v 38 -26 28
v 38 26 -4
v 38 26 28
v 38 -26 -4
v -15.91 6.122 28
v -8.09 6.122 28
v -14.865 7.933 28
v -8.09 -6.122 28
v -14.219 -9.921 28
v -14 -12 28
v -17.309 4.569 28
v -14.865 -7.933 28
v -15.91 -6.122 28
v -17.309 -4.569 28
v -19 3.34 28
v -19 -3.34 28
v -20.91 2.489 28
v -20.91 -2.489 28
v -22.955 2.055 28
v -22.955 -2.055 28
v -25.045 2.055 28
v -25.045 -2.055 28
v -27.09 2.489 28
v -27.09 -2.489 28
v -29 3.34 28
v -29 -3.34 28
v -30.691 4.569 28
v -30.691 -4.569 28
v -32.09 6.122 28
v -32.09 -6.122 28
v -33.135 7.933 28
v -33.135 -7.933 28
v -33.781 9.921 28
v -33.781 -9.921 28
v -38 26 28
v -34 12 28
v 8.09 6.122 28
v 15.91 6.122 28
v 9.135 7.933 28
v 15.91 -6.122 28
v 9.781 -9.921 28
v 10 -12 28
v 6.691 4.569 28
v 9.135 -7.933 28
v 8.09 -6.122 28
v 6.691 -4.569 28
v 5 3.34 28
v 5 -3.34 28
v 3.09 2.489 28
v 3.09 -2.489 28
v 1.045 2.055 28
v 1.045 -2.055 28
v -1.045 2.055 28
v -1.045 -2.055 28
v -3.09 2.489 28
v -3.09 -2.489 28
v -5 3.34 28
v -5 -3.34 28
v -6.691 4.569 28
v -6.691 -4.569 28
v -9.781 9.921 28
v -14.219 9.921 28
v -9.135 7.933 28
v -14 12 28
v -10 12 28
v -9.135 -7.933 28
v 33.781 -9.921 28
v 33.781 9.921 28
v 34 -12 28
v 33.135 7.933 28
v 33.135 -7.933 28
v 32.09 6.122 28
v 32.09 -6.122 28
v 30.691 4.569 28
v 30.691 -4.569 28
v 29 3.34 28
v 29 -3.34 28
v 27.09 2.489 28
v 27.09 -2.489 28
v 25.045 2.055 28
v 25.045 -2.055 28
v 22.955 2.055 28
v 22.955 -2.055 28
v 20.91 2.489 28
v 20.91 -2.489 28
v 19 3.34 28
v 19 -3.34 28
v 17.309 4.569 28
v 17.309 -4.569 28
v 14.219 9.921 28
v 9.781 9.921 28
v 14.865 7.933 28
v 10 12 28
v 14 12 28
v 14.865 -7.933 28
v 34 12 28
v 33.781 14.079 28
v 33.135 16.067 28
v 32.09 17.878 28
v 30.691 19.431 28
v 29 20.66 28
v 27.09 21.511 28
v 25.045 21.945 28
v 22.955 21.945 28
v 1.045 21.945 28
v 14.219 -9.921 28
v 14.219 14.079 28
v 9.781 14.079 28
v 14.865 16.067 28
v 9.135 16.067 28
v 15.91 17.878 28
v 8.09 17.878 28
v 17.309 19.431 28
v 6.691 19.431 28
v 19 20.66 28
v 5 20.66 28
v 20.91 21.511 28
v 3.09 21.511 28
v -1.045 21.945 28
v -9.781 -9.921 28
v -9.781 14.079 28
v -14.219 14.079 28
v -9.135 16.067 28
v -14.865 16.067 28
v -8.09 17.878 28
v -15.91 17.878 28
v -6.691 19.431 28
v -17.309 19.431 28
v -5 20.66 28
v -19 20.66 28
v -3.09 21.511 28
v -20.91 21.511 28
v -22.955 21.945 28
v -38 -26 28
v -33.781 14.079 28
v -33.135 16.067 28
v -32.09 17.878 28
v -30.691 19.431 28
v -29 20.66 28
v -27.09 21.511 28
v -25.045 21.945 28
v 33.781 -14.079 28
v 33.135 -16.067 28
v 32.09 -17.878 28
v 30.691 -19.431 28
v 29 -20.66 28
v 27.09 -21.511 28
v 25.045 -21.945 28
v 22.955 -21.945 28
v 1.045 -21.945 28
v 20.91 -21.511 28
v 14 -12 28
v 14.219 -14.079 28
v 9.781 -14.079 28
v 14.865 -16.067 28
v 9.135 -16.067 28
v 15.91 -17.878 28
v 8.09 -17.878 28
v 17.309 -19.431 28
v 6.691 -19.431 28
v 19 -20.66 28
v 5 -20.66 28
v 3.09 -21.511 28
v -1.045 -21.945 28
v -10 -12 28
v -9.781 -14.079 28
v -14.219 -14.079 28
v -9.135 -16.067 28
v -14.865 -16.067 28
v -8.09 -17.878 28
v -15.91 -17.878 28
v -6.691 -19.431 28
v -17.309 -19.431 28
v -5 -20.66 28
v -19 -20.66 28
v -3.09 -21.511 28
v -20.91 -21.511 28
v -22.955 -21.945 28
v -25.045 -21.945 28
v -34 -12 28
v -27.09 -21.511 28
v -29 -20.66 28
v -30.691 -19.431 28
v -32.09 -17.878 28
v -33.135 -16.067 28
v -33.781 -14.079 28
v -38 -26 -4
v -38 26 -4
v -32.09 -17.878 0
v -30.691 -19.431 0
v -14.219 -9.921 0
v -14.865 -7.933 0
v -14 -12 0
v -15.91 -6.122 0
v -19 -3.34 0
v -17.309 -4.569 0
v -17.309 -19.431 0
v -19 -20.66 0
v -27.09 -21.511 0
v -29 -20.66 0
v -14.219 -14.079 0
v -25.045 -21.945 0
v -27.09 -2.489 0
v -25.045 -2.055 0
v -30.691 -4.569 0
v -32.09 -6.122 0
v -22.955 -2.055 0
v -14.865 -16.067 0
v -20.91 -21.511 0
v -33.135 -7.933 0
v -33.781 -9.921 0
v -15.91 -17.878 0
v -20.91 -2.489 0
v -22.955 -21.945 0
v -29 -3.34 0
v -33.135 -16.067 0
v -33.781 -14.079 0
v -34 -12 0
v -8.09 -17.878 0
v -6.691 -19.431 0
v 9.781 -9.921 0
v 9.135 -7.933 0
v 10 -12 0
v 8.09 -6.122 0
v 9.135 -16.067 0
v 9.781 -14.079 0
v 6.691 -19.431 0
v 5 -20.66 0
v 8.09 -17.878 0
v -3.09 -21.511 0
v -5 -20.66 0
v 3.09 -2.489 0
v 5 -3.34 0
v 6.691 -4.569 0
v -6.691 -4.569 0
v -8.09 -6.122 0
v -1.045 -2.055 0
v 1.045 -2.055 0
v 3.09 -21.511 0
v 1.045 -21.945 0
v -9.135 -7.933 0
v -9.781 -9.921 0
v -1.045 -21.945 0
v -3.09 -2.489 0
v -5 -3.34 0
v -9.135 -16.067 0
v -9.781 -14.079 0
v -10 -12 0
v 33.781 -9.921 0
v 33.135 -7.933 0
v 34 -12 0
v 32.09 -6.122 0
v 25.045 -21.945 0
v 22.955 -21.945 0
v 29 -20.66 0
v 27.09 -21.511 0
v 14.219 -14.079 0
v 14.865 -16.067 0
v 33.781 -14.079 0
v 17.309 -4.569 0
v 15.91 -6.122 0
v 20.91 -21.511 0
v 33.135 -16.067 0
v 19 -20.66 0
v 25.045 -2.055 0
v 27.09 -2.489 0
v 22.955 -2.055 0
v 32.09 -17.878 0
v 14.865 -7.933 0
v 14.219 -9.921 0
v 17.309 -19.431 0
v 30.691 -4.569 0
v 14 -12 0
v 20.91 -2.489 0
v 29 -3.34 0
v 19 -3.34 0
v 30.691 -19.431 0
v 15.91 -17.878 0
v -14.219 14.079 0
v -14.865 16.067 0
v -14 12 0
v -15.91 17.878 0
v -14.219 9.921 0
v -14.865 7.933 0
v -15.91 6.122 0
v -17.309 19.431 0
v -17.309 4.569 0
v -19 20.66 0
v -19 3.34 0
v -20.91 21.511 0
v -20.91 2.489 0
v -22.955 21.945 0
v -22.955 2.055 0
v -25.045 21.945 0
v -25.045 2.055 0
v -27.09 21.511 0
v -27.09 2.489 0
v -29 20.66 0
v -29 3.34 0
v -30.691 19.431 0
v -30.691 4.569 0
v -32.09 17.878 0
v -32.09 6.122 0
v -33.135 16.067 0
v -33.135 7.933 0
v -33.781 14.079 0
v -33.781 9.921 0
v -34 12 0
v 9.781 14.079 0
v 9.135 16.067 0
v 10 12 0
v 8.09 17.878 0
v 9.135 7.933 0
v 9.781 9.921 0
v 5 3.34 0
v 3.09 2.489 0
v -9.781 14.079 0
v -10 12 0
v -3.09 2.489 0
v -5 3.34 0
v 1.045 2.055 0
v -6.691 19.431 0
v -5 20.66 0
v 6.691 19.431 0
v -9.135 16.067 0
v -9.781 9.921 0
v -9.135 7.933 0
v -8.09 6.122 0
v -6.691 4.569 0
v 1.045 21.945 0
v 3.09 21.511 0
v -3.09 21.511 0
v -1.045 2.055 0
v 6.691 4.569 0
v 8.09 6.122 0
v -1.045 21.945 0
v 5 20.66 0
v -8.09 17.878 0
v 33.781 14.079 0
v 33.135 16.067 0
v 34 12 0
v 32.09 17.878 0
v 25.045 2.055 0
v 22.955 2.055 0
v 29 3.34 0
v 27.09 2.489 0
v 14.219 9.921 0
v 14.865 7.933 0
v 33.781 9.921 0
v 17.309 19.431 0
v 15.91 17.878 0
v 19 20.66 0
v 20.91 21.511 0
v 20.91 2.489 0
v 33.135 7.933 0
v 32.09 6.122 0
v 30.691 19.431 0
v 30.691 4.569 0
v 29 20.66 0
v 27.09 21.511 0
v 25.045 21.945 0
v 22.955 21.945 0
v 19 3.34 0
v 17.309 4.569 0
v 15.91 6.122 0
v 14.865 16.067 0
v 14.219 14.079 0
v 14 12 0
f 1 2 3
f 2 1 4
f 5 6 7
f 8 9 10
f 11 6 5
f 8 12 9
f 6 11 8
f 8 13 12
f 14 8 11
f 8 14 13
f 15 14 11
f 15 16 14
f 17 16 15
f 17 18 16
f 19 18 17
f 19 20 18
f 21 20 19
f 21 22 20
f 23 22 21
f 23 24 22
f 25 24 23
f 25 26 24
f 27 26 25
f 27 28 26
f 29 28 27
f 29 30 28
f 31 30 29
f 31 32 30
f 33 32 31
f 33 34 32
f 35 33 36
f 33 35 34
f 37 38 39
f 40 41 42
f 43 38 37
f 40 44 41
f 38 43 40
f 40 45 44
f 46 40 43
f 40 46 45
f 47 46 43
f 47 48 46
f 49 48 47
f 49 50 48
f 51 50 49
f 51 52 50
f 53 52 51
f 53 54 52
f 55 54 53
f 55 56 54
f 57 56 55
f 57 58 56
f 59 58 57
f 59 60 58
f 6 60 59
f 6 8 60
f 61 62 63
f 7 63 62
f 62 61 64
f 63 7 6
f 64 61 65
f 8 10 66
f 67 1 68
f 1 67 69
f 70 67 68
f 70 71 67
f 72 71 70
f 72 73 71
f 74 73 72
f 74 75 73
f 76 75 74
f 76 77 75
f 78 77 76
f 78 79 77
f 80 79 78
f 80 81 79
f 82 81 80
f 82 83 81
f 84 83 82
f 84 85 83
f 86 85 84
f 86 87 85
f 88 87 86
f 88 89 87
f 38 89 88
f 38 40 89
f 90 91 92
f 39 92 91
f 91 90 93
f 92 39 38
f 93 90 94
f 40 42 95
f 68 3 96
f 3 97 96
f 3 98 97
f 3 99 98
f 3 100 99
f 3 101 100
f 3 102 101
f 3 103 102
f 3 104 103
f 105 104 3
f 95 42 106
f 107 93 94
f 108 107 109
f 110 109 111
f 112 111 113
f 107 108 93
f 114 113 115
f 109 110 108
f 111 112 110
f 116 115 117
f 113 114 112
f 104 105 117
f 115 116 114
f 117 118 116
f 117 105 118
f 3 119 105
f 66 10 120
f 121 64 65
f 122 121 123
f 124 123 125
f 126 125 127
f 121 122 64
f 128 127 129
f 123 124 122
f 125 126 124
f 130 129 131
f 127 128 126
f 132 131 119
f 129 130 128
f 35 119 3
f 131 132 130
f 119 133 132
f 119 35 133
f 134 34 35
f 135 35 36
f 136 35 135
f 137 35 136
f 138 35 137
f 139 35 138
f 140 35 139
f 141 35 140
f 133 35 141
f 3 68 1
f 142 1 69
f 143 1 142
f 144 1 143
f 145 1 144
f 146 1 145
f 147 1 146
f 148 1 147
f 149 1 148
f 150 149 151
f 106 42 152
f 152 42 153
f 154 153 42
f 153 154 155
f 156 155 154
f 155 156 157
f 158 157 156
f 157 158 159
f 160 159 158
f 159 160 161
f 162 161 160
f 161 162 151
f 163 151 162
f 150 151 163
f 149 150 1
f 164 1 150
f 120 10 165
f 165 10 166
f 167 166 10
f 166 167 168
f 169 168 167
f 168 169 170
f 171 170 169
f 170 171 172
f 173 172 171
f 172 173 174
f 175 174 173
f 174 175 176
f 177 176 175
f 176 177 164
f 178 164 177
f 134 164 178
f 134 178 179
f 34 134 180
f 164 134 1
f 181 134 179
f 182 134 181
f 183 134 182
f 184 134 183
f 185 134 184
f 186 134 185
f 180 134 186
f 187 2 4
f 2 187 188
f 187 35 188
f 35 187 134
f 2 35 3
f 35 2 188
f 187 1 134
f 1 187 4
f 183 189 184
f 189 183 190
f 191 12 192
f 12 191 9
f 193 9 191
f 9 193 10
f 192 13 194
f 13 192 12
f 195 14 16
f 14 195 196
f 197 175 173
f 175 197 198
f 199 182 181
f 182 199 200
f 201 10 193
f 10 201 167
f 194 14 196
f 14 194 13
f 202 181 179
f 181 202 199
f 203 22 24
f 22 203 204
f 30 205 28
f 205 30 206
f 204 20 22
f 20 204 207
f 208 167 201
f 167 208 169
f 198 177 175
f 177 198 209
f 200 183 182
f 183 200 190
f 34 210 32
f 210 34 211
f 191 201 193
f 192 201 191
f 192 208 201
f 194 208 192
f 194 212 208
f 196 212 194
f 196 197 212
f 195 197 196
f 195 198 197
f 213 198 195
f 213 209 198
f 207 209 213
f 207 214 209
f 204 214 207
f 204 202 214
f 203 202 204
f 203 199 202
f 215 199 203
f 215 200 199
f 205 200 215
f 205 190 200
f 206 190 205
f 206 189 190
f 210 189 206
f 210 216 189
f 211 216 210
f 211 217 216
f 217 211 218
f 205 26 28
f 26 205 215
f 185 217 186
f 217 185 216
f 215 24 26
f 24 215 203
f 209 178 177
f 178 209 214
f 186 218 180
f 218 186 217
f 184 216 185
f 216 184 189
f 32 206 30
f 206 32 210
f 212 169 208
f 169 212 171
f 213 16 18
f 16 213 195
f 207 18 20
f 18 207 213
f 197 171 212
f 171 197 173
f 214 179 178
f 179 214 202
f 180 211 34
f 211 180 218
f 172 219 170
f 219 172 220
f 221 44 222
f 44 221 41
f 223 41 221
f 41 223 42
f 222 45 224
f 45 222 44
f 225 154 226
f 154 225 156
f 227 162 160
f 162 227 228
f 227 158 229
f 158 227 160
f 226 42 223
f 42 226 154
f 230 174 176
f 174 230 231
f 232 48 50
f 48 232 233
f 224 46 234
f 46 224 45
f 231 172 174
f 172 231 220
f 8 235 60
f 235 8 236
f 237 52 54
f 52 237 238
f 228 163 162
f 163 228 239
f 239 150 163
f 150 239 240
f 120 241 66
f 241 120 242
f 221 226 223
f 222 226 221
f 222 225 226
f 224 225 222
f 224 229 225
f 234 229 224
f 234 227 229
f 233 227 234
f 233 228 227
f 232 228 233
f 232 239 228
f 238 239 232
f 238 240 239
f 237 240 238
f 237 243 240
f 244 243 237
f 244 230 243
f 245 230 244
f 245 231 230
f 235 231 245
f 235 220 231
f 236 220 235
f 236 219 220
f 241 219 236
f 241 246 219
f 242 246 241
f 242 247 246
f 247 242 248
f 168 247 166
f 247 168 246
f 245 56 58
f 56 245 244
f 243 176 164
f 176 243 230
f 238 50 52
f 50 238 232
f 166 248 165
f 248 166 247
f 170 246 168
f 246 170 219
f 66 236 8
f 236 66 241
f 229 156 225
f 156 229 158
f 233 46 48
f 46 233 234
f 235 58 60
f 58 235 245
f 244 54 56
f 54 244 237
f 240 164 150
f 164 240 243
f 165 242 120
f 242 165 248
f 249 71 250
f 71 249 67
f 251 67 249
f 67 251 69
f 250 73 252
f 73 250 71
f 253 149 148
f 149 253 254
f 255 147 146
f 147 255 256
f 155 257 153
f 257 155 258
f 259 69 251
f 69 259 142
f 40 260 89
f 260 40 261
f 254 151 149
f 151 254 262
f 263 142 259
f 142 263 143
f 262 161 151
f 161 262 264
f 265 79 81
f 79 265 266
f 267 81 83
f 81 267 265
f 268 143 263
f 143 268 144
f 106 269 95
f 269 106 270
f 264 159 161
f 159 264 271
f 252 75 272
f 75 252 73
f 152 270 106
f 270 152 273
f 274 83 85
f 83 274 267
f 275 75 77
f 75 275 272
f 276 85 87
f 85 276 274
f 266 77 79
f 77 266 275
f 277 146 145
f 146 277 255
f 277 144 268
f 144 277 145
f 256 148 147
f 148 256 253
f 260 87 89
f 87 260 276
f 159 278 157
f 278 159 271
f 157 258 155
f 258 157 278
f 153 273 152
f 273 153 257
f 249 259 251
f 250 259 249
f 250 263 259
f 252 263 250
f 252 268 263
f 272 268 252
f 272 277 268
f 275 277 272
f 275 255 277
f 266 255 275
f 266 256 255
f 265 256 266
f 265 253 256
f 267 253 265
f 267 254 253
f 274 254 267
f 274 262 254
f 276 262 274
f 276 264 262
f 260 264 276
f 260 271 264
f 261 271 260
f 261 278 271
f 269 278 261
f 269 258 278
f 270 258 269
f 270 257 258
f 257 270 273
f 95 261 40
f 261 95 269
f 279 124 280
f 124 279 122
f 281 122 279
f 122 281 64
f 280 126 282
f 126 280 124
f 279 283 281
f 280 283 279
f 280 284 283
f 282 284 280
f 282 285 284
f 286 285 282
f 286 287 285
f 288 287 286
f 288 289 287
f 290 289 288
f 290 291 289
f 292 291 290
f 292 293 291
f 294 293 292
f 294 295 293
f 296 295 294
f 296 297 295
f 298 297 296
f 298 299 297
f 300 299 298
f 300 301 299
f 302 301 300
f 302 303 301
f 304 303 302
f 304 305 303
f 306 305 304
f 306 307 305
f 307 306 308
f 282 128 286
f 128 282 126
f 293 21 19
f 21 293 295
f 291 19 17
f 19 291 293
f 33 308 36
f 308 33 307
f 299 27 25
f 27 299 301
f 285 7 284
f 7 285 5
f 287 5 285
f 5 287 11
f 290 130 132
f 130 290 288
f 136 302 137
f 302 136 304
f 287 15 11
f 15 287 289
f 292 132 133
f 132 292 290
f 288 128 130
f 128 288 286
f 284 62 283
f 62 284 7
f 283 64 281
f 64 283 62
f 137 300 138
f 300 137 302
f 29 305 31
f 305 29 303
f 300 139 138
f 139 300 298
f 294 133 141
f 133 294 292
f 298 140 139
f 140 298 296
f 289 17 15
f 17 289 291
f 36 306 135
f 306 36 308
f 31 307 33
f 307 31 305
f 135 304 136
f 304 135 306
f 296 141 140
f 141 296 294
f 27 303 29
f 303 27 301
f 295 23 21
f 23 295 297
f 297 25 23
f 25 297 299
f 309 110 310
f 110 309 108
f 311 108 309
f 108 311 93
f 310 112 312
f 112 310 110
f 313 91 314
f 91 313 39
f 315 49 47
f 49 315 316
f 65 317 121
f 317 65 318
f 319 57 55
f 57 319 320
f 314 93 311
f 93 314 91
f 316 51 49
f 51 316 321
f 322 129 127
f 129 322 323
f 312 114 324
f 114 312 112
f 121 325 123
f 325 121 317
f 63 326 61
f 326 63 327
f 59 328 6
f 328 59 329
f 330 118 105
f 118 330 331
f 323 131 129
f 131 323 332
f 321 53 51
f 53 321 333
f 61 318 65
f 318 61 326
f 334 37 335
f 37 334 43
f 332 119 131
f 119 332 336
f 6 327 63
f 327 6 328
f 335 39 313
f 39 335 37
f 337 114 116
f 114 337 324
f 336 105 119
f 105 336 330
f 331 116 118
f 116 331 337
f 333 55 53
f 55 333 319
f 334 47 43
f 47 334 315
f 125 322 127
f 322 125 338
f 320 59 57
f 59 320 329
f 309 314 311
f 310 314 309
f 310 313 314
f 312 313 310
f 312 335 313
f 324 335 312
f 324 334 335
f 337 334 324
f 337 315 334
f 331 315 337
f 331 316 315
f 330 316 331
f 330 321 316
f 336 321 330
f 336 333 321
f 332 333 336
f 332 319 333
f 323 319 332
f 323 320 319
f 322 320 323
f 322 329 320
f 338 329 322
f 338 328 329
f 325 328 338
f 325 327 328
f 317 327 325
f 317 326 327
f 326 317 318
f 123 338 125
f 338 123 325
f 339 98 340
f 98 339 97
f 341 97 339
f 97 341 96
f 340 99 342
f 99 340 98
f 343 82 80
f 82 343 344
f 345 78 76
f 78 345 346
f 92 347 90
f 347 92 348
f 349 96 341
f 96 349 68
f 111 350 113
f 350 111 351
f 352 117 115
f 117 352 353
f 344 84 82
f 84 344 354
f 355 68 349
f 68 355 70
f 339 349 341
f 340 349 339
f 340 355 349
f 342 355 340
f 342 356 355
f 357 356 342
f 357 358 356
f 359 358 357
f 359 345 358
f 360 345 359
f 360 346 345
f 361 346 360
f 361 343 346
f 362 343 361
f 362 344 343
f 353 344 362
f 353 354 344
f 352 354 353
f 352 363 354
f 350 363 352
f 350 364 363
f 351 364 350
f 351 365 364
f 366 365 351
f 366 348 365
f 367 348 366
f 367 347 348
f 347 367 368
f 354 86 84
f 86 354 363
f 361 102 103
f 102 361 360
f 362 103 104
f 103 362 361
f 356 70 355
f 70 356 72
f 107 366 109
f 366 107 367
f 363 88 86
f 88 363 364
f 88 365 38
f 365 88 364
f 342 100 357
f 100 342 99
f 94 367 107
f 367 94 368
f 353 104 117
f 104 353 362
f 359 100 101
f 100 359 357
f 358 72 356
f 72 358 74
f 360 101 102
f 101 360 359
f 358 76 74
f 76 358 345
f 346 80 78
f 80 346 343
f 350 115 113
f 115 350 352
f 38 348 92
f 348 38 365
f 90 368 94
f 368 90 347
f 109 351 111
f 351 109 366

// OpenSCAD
eps_hole = 2;

module holes(total_width, total_length, height, rows_of_hole_diameters) {
  n_rows = len(rows_of_hole_diameters);
  space_between_rows = n_rows > 1 ? total_length / (n_rows - 1) : 0;

  for (i = [0:(n_rows-1)]) {
    row = rows_of_hole_diameters[i];
    n_cols = len(row);
    
    space_between_cols = n_cols > 1 ? total_width / (n_cols - 1) : 0;
    
    for (j = [0:(n_cols-1)]) {
      offset_x = n_cols > 1 ? -0.5*total_width + j*space_between_cols : 0;
      //offset_y = n_rows > 1 ? -0.5*total_length + (i > 0 ? i-0.2 : 0)*space_between_rows : 0;
      offset_y = n_rows > 1 ? -0.5*total_length + i*space_between_rows : 0;

      if (row[j] > 0) {
        translate([offset_x, offset_y, 0]) cylinder(h=height, d=row[j]+eps_hole);
      }
    }
  }

}

module hole_bridge(total_width, total_length, height, rows_of_hole_diameters, row_idx, hole_l_idx) {
  n_rows = len(rows_of_hole_diameters);
  space_between_rows = total_length / (n_rows - 1);
  
  row = rows_of_hole_diameters[row_idx];
  n_cols = len(row);
    
  space_between_cols = total_width / (n_cols - 1);
  
  bridge_depth = max(row[hole_l_idx], row[hole_l_idx+1]) + eps_hole;

  hole_r_idx = hole_l_idx + 1;
  offset_x = -0.5*total_width + (hole_l_idx+0.5)*space_between_cols;
  offset_y = -0.5*total_length + row_idx*space_between_rows;
  
  translate([offset_x, offset_y, 0.5*height]) cube([space_between_cols, bridge_depth, height], center=true);
}

border = 28;
width = 48;
length = 24;
hole_diameters = [
  [18, 18, 18],
  [18, 18, 18],
];

// I think the 25 needs to be smaller
// I think the shelf thickness needs to be more

thick_shelf_l = 28;
thick_shelf_h = 28;
f_shelf_l = 1.0;
f_shelf_w = 0.675;
thick_floor = 4;
// length/2+25-.45*length, 20]) cube([.675*width, 0.9*length, 40], center=true)

difference() {
  translate([0, 0, -thick_floor]) union() {
    translate([0, 0, 0.5*(thick_shelf_l+thick_floor)]) cube([width + border, length + border, thick_shelf_l+thick_floor], center=true);
    translate([0, 0.5*(1-f_shelf_l)*length+0.5*border, 0.5*(thick_shelf_h+thick_floor)]) cube([f_shelf_w*width, f_shelf_l*length, thick_shelf_h+thick_floor], center=true);
  };
  holes(width, length, 60, hole_diameters);
  //hole_bridge(100, length, 60, hole_diameters, 2, 1);
};
